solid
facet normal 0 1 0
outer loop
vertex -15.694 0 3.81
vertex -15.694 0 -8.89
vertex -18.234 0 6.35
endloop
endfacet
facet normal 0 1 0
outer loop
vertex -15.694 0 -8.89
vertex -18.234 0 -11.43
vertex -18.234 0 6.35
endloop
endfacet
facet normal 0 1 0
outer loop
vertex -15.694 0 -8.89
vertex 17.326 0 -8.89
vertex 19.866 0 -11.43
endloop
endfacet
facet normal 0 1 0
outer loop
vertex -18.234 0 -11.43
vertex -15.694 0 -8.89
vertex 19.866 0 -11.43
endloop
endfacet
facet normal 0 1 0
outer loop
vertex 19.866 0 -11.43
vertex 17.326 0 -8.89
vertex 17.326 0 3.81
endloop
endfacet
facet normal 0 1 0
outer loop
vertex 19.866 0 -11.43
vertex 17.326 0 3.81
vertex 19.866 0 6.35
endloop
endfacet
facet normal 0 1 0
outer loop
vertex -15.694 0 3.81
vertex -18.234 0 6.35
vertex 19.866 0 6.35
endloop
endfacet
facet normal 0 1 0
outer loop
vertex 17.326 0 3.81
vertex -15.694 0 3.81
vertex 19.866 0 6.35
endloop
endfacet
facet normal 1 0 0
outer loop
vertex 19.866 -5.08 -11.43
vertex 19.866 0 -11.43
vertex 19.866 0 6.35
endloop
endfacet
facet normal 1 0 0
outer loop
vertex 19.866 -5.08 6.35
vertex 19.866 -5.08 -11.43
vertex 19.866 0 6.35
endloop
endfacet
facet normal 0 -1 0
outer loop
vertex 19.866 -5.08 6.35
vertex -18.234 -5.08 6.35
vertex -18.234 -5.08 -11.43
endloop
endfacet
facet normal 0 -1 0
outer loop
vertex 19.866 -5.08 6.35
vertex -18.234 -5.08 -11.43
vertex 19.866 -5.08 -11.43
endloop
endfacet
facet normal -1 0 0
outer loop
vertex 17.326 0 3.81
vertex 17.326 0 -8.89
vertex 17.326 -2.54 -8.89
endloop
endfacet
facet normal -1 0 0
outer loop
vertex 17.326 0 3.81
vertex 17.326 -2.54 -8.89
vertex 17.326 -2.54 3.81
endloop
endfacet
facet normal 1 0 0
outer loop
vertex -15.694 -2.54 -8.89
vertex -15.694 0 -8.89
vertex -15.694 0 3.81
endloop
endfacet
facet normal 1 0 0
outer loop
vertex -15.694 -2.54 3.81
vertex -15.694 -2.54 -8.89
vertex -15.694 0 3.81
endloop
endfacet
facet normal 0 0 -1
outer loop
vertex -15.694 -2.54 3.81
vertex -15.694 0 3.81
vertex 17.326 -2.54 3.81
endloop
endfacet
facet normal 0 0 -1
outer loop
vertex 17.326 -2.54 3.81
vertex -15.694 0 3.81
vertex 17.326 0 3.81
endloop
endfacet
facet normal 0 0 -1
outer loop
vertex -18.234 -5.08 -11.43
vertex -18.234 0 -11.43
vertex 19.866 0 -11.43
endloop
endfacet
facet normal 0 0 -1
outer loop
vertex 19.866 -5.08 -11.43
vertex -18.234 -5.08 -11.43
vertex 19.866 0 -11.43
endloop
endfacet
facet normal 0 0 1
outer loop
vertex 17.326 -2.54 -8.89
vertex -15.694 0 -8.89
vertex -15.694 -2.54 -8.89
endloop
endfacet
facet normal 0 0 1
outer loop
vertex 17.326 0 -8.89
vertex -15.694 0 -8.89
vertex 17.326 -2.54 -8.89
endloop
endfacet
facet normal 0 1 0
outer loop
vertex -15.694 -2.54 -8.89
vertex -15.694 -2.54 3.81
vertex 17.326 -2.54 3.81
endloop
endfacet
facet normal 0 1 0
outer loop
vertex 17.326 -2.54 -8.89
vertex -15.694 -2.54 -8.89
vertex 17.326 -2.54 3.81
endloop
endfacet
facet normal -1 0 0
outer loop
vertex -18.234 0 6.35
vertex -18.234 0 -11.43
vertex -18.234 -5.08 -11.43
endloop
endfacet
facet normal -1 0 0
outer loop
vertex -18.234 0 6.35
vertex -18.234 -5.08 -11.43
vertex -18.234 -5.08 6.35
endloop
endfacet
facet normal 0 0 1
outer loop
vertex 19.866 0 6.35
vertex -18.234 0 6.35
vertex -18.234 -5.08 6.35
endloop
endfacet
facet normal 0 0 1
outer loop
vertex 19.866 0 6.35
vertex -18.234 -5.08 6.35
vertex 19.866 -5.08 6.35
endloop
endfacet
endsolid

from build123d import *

# Parameters (mm, degrees)
F0_W     = 38.1
F0_H     = 17.78
F1_DEPTH = 5.08
F2_T     = -5.08
F3_T     = -2.54


with BuildPart() as f1:
    # F0 (on Front) → F1 (new body)
    with BuildSketch(Plane.XZ):
        with Locations((0.816431, -2.540001)):
            Rectangle(F0_W, F0_H)
    extrude(amount=F1_DEPTH)

    # F2
    f2_openings = [f1.faces().sort_by_distance(p)[0] for p in [
        (0.816431, 0, -2.540001),
    ]]
    offset(amount=F2_T, openings=f2_openings)

    # F3
    f3_openings = [f1.faces().sort_by_distance(p)[0] for p in [
        (0.816431, 0, -2.540001),
    ]]
    offset(amount=F3_T, openings=f3_openings)


solid = f1.part
